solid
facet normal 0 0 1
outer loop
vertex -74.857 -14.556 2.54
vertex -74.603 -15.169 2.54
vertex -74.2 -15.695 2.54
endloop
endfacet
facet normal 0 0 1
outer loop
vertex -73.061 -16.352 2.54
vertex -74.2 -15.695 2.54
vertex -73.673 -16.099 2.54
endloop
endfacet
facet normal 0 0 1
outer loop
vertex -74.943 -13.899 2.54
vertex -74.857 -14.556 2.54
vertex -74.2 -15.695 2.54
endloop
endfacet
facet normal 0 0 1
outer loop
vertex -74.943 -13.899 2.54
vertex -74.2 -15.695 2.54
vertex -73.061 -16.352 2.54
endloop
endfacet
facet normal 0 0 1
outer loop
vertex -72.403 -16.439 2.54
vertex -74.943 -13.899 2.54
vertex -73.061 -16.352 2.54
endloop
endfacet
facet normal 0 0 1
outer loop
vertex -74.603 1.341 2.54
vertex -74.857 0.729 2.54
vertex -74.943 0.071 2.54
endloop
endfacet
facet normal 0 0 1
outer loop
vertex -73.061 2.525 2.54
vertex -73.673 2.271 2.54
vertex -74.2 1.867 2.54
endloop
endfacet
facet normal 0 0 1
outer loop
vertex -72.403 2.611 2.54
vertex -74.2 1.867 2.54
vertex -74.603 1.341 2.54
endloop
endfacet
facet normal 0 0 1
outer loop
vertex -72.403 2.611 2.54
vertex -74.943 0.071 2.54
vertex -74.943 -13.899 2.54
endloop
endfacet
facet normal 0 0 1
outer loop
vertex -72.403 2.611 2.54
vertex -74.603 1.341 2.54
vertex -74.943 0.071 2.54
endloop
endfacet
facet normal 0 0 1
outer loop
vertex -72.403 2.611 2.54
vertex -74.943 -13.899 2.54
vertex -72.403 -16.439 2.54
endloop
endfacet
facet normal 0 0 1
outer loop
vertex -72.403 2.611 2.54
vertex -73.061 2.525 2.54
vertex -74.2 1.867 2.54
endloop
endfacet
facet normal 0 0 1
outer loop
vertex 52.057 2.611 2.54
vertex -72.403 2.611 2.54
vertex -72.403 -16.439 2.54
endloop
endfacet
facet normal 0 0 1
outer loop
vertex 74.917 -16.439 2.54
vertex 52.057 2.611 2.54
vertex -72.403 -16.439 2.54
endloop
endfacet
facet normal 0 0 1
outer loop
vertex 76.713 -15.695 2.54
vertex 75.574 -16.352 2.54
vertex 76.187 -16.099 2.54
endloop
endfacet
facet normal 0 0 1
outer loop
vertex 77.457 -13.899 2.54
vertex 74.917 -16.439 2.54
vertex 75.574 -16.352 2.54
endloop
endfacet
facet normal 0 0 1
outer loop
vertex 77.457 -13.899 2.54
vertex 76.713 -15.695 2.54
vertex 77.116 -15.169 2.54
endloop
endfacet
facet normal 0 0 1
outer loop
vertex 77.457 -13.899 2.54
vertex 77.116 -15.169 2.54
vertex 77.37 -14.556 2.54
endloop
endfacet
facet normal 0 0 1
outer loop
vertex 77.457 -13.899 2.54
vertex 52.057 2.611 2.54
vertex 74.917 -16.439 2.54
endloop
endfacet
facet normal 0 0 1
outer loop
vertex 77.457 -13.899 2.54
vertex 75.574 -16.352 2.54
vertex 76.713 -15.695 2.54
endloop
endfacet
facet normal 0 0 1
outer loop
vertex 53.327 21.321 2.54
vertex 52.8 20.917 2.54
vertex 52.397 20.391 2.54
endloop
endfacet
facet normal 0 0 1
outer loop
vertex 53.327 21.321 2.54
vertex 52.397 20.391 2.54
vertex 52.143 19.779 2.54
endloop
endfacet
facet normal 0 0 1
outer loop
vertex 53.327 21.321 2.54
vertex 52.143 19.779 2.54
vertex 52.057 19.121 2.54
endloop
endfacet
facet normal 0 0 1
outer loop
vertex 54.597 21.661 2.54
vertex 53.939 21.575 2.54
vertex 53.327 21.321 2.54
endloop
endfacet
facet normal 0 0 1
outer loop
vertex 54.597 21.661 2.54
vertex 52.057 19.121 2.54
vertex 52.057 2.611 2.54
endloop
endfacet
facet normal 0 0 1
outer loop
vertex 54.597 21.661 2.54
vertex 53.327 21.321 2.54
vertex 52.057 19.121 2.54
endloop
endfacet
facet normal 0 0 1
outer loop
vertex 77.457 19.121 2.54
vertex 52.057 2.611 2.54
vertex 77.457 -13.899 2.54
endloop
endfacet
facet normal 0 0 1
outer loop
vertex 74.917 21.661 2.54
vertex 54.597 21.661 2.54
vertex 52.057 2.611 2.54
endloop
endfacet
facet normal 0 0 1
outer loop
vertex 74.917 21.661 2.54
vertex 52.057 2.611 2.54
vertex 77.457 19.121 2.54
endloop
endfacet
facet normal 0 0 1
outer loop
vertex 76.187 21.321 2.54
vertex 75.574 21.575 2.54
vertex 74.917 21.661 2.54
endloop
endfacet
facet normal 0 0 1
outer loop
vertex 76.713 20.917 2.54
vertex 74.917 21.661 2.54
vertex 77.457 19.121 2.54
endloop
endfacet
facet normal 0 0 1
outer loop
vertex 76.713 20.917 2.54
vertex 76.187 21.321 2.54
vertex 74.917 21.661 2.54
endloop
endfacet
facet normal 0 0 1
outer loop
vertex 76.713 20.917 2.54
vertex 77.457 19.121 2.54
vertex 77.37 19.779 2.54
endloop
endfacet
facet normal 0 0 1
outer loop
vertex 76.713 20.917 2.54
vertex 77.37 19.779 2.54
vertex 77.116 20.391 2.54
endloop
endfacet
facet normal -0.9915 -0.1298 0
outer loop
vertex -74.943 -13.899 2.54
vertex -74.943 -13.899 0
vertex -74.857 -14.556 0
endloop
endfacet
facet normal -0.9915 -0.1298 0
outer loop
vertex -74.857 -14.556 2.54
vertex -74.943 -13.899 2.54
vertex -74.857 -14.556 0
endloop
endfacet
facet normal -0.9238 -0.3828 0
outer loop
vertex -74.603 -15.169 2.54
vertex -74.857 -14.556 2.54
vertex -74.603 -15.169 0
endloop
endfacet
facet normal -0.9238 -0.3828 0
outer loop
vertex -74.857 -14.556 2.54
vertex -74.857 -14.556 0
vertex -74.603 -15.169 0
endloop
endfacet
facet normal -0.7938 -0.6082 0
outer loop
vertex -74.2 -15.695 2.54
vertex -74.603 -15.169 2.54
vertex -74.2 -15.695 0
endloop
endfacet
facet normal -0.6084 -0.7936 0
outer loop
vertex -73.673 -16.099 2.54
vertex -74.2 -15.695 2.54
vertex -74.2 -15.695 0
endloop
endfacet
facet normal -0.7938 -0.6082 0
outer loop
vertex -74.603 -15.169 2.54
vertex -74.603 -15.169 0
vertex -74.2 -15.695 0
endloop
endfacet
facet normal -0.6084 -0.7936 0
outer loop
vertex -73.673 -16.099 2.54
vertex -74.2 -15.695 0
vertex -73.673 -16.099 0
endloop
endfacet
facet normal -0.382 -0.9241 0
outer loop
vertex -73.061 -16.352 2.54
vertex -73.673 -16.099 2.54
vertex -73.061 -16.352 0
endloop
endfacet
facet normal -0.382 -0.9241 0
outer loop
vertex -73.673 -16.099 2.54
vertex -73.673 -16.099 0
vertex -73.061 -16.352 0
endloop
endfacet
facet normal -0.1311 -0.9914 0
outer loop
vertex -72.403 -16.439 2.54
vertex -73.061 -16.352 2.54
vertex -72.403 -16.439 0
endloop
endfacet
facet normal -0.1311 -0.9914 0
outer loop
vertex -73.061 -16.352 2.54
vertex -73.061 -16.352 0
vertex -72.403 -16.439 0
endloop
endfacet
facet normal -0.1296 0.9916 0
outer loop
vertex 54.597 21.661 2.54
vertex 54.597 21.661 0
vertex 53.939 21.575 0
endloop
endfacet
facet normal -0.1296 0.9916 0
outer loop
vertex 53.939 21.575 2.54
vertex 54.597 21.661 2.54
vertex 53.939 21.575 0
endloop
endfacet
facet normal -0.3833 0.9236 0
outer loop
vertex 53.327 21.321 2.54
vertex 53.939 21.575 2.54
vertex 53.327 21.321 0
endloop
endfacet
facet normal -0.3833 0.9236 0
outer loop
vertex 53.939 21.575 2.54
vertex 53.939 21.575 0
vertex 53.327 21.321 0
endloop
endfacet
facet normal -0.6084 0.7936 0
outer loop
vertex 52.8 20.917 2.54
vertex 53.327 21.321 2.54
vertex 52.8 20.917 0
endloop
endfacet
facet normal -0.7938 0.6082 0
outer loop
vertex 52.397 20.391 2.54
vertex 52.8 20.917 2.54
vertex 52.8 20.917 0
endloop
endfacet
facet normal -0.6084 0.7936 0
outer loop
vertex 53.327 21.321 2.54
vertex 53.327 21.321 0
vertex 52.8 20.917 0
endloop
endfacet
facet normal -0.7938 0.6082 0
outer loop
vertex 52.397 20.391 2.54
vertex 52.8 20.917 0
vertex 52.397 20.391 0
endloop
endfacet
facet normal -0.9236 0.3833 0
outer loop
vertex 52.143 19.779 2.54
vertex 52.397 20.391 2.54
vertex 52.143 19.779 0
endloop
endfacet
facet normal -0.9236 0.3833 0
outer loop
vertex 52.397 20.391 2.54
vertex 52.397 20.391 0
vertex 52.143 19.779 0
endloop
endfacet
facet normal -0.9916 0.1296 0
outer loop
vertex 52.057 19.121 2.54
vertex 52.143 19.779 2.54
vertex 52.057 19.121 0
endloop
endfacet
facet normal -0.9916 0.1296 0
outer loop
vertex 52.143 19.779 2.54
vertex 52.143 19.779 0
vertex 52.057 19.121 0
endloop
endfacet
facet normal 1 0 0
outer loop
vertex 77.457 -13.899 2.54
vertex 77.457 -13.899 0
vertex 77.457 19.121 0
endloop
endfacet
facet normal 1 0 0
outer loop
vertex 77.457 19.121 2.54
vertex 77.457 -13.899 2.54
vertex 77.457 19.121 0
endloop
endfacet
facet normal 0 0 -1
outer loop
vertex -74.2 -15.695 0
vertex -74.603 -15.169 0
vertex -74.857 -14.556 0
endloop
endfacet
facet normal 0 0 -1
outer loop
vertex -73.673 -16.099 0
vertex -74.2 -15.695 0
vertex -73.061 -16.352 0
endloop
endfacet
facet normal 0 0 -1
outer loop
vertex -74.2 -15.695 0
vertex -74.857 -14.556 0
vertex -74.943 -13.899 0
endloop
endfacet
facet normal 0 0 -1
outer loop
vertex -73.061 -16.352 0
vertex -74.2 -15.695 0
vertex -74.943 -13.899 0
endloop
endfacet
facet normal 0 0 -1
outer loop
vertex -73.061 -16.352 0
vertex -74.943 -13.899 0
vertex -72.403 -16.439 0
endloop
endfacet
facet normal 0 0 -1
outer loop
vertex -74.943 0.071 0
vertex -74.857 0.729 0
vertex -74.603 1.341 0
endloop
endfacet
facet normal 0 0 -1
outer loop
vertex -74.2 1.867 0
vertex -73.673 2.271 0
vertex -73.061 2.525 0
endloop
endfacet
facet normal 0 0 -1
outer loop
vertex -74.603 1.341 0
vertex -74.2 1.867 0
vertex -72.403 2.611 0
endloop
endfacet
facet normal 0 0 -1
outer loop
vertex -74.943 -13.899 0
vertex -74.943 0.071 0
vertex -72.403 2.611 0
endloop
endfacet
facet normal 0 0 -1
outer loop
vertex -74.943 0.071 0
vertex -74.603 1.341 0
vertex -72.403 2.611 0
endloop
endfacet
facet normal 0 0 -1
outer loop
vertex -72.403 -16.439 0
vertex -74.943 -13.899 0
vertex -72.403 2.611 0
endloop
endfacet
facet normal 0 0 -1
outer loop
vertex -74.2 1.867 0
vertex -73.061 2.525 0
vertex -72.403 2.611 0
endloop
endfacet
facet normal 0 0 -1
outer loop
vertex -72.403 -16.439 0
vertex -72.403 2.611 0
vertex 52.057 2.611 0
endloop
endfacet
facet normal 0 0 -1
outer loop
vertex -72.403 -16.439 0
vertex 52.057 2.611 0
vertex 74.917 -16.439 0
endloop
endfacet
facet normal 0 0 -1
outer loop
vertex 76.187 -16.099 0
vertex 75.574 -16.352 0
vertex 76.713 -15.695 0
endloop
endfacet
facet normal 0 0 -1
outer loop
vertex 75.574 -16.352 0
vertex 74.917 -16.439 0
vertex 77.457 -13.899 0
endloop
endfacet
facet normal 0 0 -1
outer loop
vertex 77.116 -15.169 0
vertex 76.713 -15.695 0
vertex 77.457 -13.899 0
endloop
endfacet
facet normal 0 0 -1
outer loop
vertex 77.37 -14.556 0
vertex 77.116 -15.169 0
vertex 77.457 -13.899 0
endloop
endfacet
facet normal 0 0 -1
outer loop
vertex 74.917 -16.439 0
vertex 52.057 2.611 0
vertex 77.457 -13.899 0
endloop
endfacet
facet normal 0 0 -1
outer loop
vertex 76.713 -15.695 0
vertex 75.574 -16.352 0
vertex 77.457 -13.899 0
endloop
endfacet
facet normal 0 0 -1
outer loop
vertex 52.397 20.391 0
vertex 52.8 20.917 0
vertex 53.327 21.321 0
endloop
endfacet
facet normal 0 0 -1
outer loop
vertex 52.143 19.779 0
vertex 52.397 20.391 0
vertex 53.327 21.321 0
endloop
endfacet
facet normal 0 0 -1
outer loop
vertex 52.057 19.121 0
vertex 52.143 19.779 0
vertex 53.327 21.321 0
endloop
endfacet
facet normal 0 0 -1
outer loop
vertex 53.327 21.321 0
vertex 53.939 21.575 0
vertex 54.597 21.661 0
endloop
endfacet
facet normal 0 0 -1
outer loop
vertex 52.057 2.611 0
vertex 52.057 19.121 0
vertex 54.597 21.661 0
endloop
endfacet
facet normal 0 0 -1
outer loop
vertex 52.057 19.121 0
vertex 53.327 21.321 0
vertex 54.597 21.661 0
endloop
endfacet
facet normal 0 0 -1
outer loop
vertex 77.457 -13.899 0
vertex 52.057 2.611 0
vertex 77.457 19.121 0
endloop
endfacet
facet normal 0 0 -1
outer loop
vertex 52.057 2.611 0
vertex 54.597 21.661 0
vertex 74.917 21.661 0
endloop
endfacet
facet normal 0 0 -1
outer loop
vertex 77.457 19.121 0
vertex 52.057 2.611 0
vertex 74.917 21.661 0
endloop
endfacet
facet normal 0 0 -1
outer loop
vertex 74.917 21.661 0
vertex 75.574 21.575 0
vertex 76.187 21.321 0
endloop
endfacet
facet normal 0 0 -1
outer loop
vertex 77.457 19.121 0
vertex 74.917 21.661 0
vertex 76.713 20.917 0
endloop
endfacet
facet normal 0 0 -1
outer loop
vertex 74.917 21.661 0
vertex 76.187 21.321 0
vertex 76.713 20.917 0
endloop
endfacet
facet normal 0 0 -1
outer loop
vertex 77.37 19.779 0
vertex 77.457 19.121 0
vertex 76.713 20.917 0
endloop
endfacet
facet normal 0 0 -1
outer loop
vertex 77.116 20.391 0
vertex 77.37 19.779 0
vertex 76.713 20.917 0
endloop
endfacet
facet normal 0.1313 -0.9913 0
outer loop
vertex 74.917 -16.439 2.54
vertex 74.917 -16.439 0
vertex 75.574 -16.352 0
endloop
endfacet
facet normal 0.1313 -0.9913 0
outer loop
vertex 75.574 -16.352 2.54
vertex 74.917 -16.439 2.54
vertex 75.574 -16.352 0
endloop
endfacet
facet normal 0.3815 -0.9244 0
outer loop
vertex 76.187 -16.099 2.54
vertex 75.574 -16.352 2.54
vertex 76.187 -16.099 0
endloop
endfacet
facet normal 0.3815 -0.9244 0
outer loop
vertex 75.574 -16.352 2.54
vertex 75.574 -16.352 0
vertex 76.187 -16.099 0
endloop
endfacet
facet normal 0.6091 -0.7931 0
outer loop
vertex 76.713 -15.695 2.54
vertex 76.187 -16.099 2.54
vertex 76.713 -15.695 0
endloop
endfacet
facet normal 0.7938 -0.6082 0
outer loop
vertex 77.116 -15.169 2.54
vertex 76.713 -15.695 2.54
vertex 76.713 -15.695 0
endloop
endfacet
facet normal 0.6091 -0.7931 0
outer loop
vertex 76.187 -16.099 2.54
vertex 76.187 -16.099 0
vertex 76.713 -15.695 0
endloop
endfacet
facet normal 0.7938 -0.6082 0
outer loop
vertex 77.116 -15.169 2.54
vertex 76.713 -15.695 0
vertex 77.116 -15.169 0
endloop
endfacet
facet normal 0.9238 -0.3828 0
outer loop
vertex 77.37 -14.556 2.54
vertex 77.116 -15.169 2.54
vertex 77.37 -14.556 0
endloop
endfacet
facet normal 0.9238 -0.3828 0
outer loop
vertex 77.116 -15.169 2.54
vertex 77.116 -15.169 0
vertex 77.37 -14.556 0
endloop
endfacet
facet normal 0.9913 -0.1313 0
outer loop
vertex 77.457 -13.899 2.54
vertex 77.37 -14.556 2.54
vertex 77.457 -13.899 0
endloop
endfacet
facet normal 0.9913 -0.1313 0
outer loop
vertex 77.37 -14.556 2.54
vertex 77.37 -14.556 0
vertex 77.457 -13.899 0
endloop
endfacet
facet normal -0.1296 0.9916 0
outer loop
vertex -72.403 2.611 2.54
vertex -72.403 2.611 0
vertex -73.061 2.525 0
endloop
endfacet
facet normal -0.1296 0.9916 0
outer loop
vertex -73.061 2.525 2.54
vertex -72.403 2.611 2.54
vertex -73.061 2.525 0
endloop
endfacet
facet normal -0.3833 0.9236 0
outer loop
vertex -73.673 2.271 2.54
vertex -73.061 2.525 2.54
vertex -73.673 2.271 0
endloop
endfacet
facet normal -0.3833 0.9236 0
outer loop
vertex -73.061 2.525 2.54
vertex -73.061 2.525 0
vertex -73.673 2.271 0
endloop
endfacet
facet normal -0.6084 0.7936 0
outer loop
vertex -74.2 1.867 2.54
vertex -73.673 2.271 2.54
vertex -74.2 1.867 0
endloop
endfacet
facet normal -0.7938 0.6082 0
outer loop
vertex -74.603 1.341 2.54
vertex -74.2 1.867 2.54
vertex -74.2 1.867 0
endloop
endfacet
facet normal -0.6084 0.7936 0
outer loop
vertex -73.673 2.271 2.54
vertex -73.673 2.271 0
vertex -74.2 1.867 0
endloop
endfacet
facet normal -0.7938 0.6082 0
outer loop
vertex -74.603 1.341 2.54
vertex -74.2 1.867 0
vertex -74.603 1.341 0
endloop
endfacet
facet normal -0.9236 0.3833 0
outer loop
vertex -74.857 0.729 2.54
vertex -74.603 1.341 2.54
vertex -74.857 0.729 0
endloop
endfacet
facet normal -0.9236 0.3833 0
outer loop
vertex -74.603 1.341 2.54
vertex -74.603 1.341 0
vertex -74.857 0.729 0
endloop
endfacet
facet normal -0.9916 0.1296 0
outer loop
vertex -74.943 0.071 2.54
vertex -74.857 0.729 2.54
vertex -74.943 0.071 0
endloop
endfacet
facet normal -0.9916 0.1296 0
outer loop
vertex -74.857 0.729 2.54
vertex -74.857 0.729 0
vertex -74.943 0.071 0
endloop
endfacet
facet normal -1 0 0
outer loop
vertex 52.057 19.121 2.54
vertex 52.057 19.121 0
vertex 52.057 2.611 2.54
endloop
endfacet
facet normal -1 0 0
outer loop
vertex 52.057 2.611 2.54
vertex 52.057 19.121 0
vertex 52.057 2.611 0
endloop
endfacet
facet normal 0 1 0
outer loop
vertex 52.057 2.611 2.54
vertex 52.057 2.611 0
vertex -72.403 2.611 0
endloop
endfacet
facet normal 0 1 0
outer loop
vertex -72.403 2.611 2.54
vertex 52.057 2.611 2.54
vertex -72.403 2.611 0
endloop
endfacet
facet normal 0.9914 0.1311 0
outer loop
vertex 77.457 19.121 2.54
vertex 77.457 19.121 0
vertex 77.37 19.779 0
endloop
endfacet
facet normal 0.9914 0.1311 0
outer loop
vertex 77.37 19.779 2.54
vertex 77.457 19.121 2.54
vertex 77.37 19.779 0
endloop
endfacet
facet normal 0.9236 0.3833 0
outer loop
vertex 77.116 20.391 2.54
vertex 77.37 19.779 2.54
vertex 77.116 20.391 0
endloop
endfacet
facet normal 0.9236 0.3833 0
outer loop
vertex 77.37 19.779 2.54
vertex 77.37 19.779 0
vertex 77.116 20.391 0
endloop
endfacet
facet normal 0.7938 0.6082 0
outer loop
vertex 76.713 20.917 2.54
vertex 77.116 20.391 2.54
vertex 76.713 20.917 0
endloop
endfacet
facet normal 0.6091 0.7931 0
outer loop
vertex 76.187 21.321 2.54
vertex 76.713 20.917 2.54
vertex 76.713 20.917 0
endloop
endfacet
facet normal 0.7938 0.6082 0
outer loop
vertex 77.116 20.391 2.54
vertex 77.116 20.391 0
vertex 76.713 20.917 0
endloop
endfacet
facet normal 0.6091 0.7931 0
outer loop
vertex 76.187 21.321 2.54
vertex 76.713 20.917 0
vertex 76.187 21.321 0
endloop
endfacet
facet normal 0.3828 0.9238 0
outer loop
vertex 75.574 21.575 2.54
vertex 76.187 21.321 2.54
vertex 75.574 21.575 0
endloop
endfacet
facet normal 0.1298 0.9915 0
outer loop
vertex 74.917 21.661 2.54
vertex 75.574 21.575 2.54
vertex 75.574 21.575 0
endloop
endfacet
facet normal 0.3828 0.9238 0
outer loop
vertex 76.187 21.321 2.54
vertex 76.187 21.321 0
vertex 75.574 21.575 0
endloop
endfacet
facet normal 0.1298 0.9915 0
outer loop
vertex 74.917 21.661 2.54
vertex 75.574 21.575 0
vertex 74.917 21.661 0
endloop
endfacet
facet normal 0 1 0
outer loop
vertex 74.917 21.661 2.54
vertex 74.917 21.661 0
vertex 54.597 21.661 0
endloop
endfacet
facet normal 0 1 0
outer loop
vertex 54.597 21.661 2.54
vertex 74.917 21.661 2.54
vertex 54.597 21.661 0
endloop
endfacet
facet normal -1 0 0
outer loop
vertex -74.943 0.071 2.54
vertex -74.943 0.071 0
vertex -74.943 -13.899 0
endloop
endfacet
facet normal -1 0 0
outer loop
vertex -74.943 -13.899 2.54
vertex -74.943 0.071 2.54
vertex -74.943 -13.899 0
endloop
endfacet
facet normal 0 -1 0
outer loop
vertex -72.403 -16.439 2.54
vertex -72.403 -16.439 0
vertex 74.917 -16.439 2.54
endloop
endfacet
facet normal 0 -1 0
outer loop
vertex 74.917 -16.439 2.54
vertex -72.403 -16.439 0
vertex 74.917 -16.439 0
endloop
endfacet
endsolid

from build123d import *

# Parameters (mm, degrees)
F1_DEPTH = 2.54


with BuildPart() as f1:
    # F0 (on Top) → F1 (new body)
    with BuildSketch(Plane.XY):
        with BuildLine():
            Line((52.056518, 2.611155), (-72.403482, 2.611155))
            ThreePointArc((-72.403482, 2.611155), (-74.199533, 1.867206), (-74.943482, 0.071155))
            Line((-74.943482, 0.071155), (-74.943482, -13.898845))
            ThreePointArc((-74.943482, -13.898845), (-74.199533, -15.694897), (-72.403482, -16.438845))
            Line((-72.403482, -16.438845), (74.916518, -16.438845))
            ThreePointArc((74.916518, -16.438845), (76.712569, -15.694897), (77.456518, -13.898845))
            Line((77.456518, -13.898845), (77.456518, 2.611155))
            Line((77.456518, 2.611155), (77.456518, 19.121155))
            ThreePointArc((77.456518, 19.121155), (76.712569, 20.917206), (74.916518, 21.661155))
            Line((74.916518, 21.661155), (54.596518, 21.661155))
            ThreePointArc((54.596518, 21.661155), (52.800467, 20.917206), (52.056518, 19.121155))
            Line((52.056518, 19.121155), (52.056518, 2.611155))
        make_face()
    extrude(amount=F1_DEPTH)


solid = f1.part
